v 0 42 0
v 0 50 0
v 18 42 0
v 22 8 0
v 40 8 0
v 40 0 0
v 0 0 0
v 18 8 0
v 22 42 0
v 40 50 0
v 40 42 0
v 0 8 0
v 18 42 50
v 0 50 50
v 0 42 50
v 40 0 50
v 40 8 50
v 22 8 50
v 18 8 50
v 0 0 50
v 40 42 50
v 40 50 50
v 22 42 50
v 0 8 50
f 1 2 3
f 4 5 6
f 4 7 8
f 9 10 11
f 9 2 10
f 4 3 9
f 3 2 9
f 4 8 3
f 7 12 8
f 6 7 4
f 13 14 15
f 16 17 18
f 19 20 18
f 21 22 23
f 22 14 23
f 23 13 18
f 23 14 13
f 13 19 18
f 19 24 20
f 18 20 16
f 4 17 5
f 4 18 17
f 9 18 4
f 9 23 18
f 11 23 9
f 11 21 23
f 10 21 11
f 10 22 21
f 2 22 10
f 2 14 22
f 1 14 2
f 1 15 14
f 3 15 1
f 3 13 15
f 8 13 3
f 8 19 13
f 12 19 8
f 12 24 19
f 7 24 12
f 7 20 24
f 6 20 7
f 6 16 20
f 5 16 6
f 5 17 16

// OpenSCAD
$fn = 32;

// ----------------------------------------------------------------------
// Structural section: ibeam 40 x 50 mm
// ----------------------------------------------------------------------

// --- parameters (mm) ---
sec_w = 40;               // section width, X
sec_h = 50;               // section height, Y
flange_t = 8;             // flange thickness
web_t = 4;                // web thickness
plate_t = 50;             // cut length, Z (extrusion height)

profile = [[0, 0], [40, 0], [40, 8], [22, 8], [22, 42], [40, 42], [40, 50], [0, 50], [0, 42], [18, 42], [18, 8], [0, 8]];  // primary outline, 12 points, counter clockwise

// --- the one profile operation ---
linear_extrude(height = plate_t) polygon(points = profile);
